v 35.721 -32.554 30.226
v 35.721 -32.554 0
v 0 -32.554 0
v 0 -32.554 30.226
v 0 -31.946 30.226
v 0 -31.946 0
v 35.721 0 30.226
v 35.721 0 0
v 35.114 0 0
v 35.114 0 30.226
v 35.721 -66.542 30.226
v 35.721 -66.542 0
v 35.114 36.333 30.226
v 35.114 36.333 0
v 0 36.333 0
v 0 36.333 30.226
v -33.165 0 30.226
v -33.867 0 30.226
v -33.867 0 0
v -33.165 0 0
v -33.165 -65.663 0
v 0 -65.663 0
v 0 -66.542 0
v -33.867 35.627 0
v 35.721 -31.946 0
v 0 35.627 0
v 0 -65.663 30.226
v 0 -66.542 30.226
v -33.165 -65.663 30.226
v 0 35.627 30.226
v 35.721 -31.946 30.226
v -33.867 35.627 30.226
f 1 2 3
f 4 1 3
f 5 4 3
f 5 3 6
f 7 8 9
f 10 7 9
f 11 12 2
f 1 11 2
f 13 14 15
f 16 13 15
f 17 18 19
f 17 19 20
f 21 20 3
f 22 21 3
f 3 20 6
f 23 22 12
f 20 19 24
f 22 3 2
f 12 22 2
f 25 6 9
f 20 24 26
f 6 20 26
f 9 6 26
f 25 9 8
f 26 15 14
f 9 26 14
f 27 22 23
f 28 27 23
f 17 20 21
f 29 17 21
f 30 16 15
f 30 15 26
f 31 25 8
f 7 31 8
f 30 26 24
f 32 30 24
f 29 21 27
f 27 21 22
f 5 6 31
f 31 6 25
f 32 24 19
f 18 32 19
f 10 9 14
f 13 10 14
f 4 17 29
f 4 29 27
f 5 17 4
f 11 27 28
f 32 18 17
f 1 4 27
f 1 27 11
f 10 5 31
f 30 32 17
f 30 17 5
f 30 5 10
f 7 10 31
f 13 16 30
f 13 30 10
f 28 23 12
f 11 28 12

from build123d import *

# Parameters (mm, degrees)
F0_W     = 39.7309437394
F0_H     = 35.8594581485
F0_H_2   = 34.1520495713
F0_W_2   = 39.8523285985
F1_DEPTH = 25.4
F2_W     = 39.7309437394
F2_H     = 34.1520495713
F3_DEPTH = 25.4
F5_W     = 33.1652238965
F5_H     = 31.9460257888
F6_DEPTH = 30.226


with BuildPart() as f1:
    # F0 (on Top) → F1 (new body)
    with BuildSketch(Plane.XY):
        with Locations((-19.8654718697, 17.9297290742)):
            Rectangle(F0_W, F0_H)
        with Locations((-19.8654718697, -17.0760247856)):
            Rectangle(F0_W, F0_H_2)
        with Locations((19.9261642992, 17.9297290742)):
            Rectangle(F0_W_2, F0_H)
    extrude(amount=F1_DEPTH)

    # F2 (on face) → F3 (join)
    with BuildSketch(Plane.XY.offset(25.4)):
        with Locations((-19.8654718697, -17.0760247856)):
            Rectangle(F2_W, F2_H)
    extrude(amount=F3_DEPTH)


with BuildPart() as f6:
    # F5 (on Top) → F6 (new body)
    with BuildSketch(Plane.XY):
        with Locations((-16.5826119483, -15.9730128944)):
            Rectangle(F5_W, F5_H)
        Polygon((-33.1652238965, 0), (0, 0), (0, 35.6270745397), (-33.8673219085, 35.6270745397), (-33.8673219085, 0), align=None)
        Polygon((0, 35.6270745397), (0, 0), (35.113606602, 0), (35.113606602, 36.3328047097), (0, 36.3328047097), align=None)
        Polygon((35.113606602, 0), (0, 0), (0, -31.9460257888), (35.7213914394, -31.9460257888), (35.7213914394, 0), align=None)
        Polygon((0, -32.553806901), (0, -31.9460257888), (-33.1652238965, -31.9460257888), (-33.1652238965, -65.6626299024), (0, -65.6626299024), align=None)
        Polygon((35.7213914394, -32.553806901), (0, -32.553806901), (0, -65.6626299024), (0, -66.5416121483), (35.7213914394, -66.5416121483), align=None)
    extrude(amount=F6_DEPTH)


solid = f6.part
